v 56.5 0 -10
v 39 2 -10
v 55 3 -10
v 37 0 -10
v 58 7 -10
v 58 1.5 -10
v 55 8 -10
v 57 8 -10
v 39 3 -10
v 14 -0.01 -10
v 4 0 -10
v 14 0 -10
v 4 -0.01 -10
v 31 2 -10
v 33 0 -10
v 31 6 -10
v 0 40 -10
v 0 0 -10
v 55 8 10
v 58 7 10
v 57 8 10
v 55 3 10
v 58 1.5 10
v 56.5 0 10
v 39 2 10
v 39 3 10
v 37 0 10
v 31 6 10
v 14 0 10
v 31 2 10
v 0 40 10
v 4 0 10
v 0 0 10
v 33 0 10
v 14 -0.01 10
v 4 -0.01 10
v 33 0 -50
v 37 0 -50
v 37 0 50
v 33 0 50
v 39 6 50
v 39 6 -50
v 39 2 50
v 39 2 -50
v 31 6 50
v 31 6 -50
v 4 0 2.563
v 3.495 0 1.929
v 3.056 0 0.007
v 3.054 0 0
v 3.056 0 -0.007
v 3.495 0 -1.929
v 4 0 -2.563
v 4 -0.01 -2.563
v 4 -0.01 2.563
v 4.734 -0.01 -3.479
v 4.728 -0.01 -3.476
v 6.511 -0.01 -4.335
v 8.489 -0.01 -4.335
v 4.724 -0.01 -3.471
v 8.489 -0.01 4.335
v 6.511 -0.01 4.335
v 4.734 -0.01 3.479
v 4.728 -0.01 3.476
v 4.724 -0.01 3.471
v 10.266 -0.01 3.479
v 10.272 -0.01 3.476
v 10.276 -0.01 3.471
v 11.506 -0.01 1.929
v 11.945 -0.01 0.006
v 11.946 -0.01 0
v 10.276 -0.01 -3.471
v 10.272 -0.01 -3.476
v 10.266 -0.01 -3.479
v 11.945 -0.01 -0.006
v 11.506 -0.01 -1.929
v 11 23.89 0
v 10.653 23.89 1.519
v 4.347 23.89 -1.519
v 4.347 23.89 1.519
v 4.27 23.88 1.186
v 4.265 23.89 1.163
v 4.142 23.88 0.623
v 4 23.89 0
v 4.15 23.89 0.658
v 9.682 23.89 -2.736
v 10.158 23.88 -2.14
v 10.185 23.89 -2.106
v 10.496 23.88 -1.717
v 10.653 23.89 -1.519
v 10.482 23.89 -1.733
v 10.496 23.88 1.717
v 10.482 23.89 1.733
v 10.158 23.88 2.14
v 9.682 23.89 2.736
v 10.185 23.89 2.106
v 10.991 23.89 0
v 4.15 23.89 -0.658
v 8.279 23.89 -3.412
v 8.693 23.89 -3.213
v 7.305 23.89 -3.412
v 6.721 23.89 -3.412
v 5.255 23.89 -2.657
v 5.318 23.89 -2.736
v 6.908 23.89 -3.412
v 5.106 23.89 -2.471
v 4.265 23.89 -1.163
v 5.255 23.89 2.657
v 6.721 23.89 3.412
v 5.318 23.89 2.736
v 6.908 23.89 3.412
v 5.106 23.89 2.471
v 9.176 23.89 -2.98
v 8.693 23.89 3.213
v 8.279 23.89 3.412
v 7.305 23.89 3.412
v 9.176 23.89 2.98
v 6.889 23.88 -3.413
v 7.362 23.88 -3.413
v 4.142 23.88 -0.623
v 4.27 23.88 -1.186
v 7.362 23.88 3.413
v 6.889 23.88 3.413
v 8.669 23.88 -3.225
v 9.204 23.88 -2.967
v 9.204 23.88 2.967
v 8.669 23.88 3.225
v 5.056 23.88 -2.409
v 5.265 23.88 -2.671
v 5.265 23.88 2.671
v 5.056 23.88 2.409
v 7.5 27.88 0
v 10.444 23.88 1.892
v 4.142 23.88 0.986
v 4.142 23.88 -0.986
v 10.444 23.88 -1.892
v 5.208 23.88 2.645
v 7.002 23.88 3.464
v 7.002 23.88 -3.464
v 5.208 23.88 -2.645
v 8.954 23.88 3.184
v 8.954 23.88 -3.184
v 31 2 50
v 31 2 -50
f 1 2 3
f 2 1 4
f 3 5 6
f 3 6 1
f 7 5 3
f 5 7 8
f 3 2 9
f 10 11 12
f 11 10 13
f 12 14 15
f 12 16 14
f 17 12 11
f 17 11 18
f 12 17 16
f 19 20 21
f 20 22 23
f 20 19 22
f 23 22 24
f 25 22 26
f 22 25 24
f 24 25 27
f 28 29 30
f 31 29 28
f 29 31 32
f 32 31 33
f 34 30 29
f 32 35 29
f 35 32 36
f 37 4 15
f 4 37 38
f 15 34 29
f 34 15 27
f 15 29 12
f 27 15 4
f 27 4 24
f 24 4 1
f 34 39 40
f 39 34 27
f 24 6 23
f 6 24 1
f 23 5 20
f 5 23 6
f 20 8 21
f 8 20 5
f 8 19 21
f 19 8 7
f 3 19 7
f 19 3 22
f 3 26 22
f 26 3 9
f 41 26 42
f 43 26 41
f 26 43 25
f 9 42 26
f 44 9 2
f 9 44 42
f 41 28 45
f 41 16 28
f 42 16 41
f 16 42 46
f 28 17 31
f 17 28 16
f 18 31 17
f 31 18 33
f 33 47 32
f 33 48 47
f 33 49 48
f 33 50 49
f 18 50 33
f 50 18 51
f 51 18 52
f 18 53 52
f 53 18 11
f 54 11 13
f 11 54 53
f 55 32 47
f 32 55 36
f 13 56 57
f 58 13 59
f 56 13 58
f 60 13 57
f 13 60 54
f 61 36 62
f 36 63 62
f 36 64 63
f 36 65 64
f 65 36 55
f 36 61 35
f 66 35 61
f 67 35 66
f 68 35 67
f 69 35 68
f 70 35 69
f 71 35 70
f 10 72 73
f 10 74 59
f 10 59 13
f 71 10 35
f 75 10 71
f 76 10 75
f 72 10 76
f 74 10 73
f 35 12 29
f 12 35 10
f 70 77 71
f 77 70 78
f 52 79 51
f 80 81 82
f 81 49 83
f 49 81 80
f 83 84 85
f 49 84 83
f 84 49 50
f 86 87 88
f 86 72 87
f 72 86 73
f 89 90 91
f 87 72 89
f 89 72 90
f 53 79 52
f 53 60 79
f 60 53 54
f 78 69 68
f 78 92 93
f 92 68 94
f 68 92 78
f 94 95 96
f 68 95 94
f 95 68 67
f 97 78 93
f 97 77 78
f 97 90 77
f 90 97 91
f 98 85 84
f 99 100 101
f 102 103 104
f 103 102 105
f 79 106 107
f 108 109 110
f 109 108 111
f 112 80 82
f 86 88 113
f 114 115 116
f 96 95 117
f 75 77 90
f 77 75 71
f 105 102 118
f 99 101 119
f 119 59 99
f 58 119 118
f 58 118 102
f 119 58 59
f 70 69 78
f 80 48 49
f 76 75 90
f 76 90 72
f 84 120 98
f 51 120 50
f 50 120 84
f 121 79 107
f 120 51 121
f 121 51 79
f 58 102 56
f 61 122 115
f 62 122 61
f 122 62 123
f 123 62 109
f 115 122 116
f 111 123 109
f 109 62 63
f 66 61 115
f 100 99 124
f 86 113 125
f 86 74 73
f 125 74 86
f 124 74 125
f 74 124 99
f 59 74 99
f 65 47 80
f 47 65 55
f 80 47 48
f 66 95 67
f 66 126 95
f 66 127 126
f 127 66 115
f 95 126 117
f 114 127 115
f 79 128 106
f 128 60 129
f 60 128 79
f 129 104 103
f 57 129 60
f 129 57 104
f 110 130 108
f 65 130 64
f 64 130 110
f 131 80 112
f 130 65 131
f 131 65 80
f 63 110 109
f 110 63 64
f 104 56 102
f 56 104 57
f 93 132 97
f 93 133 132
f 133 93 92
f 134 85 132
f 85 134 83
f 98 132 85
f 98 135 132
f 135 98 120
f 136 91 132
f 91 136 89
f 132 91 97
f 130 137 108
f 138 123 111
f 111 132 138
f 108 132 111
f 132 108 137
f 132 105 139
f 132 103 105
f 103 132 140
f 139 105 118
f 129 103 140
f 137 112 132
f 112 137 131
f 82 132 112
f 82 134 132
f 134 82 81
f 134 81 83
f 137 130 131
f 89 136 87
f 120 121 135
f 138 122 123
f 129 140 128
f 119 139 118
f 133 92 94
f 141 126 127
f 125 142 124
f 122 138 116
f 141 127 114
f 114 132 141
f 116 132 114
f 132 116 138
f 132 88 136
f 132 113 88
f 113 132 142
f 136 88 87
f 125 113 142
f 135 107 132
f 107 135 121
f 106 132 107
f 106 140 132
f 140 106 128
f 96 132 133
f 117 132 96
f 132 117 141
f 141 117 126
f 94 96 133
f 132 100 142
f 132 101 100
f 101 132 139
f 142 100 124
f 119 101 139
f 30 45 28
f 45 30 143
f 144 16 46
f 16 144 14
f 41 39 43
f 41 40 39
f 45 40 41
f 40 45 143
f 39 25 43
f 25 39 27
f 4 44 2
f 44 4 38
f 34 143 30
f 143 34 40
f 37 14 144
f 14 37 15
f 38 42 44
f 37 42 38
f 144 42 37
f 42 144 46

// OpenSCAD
difference() {
translate([0,0,-10])
linear_extrude(height=20) {
polygon(points=[
[0,0],
[56.5,0],
[58,1.5],
[58,7],
[57,8],
[55,8],
[55,3],
[39,3],
[39,6],
[31,6],
[0,40]]);

polygon(points=[
[4,-0.01],
[5,25],
[9,30],
[13,25],
[14,-0.01]]);

}
translate([3+4.5,23.89,0])
    rotate([90,0,0])
        cylinder(h=24,r1=7/2,r2=8.9/2);
translate([3+4.5,27.88,0])
    rotate([90,0,0])
        cylinder(h=4,r1=0,r2=7/2);

}

translate([0,0,-50])
linear_extrude(height=100) {
polygon(points=[
[31,2],
[33,0],
[37,0],
[39,2],
[39,6],
[31,6]]);
}
